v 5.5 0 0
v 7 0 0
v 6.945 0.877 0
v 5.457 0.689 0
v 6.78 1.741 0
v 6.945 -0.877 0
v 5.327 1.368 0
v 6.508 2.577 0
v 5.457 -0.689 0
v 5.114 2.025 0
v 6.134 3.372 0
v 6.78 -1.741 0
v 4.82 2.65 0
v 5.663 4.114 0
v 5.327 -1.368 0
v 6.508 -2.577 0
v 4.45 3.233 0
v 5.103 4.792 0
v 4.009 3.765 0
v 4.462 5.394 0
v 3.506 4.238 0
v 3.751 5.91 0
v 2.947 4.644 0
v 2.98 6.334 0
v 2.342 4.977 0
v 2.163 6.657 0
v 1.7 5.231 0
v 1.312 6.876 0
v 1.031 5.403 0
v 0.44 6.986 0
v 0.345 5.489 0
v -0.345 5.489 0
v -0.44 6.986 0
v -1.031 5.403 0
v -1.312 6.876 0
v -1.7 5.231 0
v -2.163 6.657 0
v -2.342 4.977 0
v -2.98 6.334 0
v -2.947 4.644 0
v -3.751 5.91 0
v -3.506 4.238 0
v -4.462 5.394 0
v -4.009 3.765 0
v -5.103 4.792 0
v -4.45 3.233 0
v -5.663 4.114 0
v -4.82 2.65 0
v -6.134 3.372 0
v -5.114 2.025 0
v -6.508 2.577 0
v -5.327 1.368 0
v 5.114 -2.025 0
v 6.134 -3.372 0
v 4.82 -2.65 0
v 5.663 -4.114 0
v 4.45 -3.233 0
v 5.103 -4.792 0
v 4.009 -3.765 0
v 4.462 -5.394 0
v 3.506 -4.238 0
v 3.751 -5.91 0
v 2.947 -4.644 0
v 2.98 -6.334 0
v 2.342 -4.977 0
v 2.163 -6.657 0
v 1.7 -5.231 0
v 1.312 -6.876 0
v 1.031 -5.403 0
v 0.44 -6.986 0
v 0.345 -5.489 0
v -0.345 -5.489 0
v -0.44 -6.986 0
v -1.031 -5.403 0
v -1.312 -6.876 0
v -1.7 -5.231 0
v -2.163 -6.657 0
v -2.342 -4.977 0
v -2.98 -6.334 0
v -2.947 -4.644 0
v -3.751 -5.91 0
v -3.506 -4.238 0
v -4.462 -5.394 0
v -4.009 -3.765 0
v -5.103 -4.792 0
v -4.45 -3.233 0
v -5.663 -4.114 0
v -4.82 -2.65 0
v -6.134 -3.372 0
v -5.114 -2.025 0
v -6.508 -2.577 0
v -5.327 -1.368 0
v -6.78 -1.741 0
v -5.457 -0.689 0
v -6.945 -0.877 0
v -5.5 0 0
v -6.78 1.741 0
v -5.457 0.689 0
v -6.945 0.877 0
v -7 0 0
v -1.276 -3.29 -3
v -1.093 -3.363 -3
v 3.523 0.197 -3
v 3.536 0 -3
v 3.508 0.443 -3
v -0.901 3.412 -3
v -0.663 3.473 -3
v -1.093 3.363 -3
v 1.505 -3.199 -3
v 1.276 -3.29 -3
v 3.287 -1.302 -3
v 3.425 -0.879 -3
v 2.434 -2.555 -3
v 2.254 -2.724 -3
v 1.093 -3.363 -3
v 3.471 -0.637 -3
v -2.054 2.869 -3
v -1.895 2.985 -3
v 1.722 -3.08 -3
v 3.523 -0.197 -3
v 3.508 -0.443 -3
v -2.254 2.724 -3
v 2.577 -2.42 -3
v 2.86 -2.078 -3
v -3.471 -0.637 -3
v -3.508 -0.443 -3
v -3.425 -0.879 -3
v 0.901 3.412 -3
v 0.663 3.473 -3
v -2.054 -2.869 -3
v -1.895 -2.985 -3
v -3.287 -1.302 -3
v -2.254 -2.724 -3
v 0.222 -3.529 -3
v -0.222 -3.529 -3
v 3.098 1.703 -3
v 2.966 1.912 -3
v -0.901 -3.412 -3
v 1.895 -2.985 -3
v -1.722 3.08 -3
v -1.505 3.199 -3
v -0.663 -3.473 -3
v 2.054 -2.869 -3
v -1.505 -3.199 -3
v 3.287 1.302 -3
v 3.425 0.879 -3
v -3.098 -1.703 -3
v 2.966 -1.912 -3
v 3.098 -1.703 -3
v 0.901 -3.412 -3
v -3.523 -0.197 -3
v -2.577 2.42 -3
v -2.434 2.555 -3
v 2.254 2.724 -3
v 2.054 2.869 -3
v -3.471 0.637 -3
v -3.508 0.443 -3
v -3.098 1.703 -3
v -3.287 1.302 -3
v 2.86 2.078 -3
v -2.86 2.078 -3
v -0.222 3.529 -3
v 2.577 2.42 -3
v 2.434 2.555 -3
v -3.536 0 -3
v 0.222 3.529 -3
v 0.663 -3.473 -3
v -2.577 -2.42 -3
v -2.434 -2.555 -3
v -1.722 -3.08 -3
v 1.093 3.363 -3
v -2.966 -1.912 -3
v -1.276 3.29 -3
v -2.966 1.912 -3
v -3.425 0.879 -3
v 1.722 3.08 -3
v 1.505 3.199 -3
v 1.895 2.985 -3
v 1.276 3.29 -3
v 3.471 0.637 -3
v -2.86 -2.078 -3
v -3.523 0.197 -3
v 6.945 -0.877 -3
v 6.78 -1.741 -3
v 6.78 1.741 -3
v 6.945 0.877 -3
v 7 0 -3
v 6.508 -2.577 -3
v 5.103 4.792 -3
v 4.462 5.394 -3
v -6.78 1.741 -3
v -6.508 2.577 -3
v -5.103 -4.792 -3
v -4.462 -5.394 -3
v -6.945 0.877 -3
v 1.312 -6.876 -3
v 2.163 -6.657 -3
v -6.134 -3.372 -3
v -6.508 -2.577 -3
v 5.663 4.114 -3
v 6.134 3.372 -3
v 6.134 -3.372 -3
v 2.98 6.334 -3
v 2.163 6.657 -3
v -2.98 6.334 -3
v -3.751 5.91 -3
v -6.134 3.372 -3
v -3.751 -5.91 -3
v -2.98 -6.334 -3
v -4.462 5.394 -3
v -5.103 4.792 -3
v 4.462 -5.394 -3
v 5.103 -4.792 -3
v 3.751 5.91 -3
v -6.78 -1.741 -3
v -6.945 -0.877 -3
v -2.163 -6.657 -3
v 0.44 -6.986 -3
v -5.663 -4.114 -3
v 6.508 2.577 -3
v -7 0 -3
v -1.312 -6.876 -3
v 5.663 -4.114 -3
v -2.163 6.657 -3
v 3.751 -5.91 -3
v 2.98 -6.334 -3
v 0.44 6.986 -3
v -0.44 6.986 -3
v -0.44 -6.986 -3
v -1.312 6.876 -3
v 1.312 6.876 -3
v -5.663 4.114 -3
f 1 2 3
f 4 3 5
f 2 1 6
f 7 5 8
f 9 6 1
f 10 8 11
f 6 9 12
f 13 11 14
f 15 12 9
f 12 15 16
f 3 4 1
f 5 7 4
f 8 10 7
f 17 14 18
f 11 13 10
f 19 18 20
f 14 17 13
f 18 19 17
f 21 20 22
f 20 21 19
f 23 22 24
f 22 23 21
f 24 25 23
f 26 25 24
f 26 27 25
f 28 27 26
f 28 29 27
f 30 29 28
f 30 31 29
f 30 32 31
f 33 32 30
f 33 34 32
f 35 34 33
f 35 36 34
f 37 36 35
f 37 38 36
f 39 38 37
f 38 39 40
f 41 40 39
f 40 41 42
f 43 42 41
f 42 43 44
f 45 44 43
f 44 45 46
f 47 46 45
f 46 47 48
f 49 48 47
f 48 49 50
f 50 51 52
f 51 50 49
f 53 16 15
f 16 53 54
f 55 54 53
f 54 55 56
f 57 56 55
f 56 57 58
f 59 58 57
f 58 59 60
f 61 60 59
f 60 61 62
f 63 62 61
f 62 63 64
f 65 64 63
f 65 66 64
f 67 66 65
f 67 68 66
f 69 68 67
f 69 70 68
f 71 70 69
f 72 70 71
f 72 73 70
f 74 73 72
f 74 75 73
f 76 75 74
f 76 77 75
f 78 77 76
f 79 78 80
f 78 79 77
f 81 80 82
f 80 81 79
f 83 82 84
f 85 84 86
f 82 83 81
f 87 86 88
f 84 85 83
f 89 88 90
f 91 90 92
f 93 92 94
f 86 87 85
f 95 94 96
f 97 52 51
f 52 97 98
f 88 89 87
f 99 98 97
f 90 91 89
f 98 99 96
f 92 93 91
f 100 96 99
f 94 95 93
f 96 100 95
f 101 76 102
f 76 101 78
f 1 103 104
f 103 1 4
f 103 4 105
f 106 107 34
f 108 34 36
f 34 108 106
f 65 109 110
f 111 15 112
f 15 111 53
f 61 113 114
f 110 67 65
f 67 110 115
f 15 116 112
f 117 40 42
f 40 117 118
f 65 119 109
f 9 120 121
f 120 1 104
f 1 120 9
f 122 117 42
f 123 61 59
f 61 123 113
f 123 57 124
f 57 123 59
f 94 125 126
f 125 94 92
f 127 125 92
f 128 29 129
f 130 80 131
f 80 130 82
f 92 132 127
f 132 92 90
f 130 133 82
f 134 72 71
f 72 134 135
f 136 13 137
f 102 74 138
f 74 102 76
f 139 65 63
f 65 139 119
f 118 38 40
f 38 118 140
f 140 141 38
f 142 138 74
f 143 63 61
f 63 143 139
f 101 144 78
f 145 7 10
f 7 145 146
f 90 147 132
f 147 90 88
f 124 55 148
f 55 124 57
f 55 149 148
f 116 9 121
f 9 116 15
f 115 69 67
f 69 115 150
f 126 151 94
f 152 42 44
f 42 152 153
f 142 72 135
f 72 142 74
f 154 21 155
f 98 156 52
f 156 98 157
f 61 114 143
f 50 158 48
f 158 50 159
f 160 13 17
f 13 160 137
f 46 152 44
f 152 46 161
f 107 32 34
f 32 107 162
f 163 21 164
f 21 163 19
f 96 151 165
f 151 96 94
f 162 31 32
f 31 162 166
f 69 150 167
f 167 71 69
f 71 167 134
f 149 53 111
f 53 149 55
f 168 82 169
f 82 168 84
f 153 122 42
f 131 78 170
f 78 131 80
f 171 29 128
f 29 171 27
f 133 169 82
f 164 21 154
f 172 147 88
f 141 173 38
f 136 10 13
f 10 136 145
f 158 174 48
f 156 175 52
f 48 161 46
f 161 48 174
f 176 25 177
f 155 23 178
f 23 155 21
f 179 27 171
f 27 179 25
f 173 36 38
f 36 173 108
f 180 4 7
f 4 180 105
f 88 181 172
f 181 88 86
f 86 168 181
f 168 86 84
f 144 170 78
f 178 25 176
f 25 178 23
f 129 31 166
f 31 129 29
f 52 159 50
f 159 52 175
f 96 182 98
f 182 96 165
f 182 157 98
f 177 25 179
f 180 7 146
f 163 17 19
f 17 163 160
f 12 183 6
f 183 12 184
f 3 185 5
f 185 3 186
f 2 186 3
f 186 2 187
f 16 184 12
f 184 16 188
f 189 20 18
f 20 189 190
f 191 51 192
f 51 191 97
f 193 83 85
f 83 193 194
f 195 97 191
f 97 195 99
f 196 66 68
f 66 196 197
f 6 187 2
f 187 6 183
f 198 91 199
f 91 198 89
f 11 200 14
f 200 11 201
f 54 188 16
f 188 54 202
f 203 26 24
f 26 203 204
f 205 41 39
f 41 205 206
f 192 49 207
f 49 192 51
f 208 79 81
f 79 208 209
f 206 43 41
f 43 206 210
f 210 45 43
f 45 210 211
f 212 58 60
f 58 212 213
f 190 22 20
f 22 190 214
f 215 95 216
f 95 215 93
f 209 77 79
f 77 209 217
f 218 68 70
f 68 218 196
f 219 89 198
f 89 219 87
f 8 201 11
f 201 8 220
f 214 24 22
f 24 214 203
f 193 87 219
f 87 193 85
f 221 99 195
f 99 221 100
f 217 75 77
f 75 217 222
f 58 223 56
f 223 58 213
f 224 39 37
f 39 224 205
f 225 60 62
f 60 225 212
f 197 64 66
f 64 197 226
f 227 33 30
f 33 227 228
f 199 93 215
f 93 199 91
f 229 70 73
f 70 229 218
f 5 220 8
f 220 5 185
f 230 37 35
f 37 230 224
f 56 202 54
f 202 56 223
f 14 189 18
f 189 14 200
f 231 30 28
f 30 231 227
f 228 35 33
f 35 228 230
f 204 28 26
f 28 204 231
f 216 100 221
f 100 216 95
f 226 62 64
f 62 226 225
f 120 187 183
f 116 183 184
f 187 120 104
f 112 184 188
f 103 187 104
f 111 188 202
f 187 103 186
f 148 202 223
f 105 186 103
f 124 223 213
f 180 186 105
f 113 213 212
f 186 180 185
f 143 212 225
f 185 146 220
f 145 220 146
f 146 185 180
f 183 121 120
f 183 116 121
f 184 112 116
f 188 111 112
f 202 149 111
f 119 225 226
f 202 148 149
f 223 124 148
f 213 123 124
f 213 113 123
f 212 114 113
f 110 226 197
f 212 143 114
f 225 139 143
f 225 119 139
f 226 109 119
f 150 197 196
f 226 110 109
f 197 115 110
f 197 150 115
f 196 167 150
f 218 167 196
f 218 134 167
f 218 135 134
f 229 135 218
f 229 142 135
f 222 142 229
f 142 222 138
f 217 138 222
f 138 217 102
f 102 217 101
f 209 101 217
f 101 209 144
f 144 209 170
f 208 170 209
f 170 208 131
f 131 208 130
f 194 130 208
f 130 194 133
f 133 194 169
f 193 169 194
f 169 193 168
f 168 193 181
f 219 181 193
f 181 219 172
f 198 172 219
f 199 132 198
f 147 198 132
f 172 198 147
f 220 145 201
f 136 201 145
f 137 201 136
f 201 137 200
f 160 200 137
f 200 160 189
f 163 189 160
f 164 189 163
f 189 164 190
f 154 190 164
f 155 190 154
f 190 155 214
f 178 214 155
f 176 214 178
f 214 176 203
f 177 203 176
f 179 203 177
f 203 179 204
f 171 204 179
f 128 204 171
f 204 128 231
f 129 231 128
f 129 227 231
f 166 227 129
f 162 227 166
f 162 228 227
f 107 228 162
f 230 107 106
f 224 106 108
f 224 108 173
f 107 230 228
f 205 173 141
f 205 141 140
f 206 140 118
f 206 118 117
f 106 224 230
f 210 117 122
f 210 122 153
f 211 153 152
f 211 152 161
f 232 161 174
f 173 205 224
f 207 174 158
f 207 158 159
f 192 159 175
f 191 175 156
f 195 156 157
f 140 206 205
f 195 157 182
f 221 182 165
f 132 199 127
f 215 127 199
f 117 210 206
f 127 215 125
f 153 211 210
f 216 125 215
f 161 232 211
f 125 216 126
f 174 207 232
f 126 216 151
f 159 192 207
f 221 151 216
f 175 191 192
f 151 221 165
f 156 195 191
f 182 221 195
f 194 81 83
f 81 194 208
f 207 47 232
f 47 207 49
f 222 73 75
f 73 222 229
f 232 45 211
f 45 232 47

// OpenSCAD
$fn = 50;


difference() {
	union() {
		translate(v = [0, 0, -3.0000000000]) {
			cylinder(h = 3, r = 7.0000000000);
		}
		cylinder(h = 0, r = 10.0000000000);
	}
	union() {
		translate(v = [0, 0, 0]) {
			rotate(a = [0, 0, 0]) {
				difference() {
					union() {
						#translate(v = [0, 0, -3.0000000000]) {
							cylinder(h = 3, r = 2.2500000000);
						}
						#translate(v = [0, 0, -4.2000000000]) {
							cylinder(h = 4.2000000000, r1 = 2.7500000000, r2 = 5.5000000000);
						}
						#translate(v = [0, 0, -3.0000000000]) {
							cylinder(h = 3, r = 2.7500000000);
						}
						#translate(v = [0, 0, -3.0000000000]) {
							cylinder(h = 3, r = 2.2500000000);
						}
					}
					union();
				}
			}
		}
	}
}
